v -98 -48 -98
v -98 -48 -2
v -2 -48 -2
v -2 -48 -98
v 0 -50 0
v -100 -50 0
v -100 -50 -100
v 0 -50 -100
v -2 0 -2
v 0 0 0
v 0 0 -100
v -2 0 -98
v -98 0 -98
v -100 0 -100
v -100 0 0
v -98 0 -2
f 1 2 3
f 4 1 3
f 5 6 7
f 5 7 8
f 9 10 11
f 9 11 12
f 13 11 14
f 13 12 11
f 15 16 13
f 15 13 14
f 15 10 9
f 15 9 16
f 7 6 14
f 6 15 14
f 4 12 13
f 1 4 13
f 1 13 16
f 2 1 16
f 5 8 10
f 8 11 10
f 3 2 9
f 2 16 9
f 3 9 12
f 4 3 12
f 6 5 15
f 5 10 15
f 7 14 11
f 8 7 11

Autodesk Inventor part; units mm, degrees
ref_plane "YZ Plane" through (0, 0, 0) normal (1, 0, 0) x (0, 1, 0)
ref_plane "XZ Plane" through (0, 0, 0) normal (0, 1, 0) x (-1, 0, 0)
ref_plane "XY Plane" through (0, 0, 0) normal (0, 0, 1) x (1, 0, 0)
sketch "Sketch1" plane through (0, 0, 0) normal (0, 1, 0) x (-1, 0, 0)
  line L0 (0, 0) -> (100, 0)
  line L1 (100, 0) -> (100, -100)
  line L2 (100, -100) -> (0, -100)
  line L3 (0, -100) -> (0, 0)
  line L4 (100, 0) -> (98, 0)
  line L5 (98, 0) -> (98, -2)
  line L6 (98, -2) -> (100, -2)
  line L7 (100, -2) -> (100, 0)
  line L8 (100, -100) -> (98, -100)
  line L9 (98, -100) -> (98, -98)
  line L10 (98, -98) -> (100, -98)
  line L11 (100, -98) -> (100, -100)
  line L12 (0, -100) -> (2, -100)
  line L13 (2, -100) -> (2, -98)
  line L14 (2, -98) -> (0, -98)
  line L15 (0, -98) -> (0, -100)
  line L16 (0, 0) -> (2, 0)
  line L17 (2, 0) -> (2, -2)
  line L18 (2, -2) -> (0, -2)
  line L19 (0, -2) -> (0, 0)
  line L20 (98, -2) -> (2, -2)
  line L21 (2, -2) -> (2, -98)
  line L22 (2, -98) -> (98, -98)
  line L23 (98, -98) -> (98, -2)
  dimension "d0" = 100
  dimension "d1" = 100
  dimension "d2" = 2
  dimension "d3" = 2
  dimension "d4" = 2
  dimension "d5" = 2
  dimension "d6" = 2
  dimension "d7" = 2
  dimension "d8" = 2
  dimension "d9" = 2
extrude "Extrusion1" add sketch "Sketch1" against normal blind 48 contours L0 L17 L18 L3 | L0 L5 L20 L17 | L18 L21 L14 L3 | L0 L1 L6 L5 | L14 L13 L2 L3 | L6 L1 L10 L23 | L22 L9 L2 L13 | L10 L1 L2 L9
sketch "Sketch2" plane through (0, -48, 0) normal (0, -1, 0) x (1, 0, 0)
  line L0 (0, 0) -> (-100, 0)
  line L1 (-100, 0) -> (-100, -100)
  line L2 (-100, -100) -> (0, -100)
  line L3 (0, -100) -> (0, 0)
extrude "Extrusion2" add sketch "Sketch2" along normal blind 2
extrude "Extrusion3" [suppressed]
sketch "Sketch4" plane through (0, 48, 0) normal (0, 1, 0) x (1, 0, 0)
  line L0 (-100, 100) -> (0, 100)
  line L1 (0, 100) -> (0, 0)
  line L2 (0, 0) -> (-100, 0)
  line L3 (-100, 0) -> (-100, 100)
extrude "Extrusion4" [suppressed]
properties part number "Box"
